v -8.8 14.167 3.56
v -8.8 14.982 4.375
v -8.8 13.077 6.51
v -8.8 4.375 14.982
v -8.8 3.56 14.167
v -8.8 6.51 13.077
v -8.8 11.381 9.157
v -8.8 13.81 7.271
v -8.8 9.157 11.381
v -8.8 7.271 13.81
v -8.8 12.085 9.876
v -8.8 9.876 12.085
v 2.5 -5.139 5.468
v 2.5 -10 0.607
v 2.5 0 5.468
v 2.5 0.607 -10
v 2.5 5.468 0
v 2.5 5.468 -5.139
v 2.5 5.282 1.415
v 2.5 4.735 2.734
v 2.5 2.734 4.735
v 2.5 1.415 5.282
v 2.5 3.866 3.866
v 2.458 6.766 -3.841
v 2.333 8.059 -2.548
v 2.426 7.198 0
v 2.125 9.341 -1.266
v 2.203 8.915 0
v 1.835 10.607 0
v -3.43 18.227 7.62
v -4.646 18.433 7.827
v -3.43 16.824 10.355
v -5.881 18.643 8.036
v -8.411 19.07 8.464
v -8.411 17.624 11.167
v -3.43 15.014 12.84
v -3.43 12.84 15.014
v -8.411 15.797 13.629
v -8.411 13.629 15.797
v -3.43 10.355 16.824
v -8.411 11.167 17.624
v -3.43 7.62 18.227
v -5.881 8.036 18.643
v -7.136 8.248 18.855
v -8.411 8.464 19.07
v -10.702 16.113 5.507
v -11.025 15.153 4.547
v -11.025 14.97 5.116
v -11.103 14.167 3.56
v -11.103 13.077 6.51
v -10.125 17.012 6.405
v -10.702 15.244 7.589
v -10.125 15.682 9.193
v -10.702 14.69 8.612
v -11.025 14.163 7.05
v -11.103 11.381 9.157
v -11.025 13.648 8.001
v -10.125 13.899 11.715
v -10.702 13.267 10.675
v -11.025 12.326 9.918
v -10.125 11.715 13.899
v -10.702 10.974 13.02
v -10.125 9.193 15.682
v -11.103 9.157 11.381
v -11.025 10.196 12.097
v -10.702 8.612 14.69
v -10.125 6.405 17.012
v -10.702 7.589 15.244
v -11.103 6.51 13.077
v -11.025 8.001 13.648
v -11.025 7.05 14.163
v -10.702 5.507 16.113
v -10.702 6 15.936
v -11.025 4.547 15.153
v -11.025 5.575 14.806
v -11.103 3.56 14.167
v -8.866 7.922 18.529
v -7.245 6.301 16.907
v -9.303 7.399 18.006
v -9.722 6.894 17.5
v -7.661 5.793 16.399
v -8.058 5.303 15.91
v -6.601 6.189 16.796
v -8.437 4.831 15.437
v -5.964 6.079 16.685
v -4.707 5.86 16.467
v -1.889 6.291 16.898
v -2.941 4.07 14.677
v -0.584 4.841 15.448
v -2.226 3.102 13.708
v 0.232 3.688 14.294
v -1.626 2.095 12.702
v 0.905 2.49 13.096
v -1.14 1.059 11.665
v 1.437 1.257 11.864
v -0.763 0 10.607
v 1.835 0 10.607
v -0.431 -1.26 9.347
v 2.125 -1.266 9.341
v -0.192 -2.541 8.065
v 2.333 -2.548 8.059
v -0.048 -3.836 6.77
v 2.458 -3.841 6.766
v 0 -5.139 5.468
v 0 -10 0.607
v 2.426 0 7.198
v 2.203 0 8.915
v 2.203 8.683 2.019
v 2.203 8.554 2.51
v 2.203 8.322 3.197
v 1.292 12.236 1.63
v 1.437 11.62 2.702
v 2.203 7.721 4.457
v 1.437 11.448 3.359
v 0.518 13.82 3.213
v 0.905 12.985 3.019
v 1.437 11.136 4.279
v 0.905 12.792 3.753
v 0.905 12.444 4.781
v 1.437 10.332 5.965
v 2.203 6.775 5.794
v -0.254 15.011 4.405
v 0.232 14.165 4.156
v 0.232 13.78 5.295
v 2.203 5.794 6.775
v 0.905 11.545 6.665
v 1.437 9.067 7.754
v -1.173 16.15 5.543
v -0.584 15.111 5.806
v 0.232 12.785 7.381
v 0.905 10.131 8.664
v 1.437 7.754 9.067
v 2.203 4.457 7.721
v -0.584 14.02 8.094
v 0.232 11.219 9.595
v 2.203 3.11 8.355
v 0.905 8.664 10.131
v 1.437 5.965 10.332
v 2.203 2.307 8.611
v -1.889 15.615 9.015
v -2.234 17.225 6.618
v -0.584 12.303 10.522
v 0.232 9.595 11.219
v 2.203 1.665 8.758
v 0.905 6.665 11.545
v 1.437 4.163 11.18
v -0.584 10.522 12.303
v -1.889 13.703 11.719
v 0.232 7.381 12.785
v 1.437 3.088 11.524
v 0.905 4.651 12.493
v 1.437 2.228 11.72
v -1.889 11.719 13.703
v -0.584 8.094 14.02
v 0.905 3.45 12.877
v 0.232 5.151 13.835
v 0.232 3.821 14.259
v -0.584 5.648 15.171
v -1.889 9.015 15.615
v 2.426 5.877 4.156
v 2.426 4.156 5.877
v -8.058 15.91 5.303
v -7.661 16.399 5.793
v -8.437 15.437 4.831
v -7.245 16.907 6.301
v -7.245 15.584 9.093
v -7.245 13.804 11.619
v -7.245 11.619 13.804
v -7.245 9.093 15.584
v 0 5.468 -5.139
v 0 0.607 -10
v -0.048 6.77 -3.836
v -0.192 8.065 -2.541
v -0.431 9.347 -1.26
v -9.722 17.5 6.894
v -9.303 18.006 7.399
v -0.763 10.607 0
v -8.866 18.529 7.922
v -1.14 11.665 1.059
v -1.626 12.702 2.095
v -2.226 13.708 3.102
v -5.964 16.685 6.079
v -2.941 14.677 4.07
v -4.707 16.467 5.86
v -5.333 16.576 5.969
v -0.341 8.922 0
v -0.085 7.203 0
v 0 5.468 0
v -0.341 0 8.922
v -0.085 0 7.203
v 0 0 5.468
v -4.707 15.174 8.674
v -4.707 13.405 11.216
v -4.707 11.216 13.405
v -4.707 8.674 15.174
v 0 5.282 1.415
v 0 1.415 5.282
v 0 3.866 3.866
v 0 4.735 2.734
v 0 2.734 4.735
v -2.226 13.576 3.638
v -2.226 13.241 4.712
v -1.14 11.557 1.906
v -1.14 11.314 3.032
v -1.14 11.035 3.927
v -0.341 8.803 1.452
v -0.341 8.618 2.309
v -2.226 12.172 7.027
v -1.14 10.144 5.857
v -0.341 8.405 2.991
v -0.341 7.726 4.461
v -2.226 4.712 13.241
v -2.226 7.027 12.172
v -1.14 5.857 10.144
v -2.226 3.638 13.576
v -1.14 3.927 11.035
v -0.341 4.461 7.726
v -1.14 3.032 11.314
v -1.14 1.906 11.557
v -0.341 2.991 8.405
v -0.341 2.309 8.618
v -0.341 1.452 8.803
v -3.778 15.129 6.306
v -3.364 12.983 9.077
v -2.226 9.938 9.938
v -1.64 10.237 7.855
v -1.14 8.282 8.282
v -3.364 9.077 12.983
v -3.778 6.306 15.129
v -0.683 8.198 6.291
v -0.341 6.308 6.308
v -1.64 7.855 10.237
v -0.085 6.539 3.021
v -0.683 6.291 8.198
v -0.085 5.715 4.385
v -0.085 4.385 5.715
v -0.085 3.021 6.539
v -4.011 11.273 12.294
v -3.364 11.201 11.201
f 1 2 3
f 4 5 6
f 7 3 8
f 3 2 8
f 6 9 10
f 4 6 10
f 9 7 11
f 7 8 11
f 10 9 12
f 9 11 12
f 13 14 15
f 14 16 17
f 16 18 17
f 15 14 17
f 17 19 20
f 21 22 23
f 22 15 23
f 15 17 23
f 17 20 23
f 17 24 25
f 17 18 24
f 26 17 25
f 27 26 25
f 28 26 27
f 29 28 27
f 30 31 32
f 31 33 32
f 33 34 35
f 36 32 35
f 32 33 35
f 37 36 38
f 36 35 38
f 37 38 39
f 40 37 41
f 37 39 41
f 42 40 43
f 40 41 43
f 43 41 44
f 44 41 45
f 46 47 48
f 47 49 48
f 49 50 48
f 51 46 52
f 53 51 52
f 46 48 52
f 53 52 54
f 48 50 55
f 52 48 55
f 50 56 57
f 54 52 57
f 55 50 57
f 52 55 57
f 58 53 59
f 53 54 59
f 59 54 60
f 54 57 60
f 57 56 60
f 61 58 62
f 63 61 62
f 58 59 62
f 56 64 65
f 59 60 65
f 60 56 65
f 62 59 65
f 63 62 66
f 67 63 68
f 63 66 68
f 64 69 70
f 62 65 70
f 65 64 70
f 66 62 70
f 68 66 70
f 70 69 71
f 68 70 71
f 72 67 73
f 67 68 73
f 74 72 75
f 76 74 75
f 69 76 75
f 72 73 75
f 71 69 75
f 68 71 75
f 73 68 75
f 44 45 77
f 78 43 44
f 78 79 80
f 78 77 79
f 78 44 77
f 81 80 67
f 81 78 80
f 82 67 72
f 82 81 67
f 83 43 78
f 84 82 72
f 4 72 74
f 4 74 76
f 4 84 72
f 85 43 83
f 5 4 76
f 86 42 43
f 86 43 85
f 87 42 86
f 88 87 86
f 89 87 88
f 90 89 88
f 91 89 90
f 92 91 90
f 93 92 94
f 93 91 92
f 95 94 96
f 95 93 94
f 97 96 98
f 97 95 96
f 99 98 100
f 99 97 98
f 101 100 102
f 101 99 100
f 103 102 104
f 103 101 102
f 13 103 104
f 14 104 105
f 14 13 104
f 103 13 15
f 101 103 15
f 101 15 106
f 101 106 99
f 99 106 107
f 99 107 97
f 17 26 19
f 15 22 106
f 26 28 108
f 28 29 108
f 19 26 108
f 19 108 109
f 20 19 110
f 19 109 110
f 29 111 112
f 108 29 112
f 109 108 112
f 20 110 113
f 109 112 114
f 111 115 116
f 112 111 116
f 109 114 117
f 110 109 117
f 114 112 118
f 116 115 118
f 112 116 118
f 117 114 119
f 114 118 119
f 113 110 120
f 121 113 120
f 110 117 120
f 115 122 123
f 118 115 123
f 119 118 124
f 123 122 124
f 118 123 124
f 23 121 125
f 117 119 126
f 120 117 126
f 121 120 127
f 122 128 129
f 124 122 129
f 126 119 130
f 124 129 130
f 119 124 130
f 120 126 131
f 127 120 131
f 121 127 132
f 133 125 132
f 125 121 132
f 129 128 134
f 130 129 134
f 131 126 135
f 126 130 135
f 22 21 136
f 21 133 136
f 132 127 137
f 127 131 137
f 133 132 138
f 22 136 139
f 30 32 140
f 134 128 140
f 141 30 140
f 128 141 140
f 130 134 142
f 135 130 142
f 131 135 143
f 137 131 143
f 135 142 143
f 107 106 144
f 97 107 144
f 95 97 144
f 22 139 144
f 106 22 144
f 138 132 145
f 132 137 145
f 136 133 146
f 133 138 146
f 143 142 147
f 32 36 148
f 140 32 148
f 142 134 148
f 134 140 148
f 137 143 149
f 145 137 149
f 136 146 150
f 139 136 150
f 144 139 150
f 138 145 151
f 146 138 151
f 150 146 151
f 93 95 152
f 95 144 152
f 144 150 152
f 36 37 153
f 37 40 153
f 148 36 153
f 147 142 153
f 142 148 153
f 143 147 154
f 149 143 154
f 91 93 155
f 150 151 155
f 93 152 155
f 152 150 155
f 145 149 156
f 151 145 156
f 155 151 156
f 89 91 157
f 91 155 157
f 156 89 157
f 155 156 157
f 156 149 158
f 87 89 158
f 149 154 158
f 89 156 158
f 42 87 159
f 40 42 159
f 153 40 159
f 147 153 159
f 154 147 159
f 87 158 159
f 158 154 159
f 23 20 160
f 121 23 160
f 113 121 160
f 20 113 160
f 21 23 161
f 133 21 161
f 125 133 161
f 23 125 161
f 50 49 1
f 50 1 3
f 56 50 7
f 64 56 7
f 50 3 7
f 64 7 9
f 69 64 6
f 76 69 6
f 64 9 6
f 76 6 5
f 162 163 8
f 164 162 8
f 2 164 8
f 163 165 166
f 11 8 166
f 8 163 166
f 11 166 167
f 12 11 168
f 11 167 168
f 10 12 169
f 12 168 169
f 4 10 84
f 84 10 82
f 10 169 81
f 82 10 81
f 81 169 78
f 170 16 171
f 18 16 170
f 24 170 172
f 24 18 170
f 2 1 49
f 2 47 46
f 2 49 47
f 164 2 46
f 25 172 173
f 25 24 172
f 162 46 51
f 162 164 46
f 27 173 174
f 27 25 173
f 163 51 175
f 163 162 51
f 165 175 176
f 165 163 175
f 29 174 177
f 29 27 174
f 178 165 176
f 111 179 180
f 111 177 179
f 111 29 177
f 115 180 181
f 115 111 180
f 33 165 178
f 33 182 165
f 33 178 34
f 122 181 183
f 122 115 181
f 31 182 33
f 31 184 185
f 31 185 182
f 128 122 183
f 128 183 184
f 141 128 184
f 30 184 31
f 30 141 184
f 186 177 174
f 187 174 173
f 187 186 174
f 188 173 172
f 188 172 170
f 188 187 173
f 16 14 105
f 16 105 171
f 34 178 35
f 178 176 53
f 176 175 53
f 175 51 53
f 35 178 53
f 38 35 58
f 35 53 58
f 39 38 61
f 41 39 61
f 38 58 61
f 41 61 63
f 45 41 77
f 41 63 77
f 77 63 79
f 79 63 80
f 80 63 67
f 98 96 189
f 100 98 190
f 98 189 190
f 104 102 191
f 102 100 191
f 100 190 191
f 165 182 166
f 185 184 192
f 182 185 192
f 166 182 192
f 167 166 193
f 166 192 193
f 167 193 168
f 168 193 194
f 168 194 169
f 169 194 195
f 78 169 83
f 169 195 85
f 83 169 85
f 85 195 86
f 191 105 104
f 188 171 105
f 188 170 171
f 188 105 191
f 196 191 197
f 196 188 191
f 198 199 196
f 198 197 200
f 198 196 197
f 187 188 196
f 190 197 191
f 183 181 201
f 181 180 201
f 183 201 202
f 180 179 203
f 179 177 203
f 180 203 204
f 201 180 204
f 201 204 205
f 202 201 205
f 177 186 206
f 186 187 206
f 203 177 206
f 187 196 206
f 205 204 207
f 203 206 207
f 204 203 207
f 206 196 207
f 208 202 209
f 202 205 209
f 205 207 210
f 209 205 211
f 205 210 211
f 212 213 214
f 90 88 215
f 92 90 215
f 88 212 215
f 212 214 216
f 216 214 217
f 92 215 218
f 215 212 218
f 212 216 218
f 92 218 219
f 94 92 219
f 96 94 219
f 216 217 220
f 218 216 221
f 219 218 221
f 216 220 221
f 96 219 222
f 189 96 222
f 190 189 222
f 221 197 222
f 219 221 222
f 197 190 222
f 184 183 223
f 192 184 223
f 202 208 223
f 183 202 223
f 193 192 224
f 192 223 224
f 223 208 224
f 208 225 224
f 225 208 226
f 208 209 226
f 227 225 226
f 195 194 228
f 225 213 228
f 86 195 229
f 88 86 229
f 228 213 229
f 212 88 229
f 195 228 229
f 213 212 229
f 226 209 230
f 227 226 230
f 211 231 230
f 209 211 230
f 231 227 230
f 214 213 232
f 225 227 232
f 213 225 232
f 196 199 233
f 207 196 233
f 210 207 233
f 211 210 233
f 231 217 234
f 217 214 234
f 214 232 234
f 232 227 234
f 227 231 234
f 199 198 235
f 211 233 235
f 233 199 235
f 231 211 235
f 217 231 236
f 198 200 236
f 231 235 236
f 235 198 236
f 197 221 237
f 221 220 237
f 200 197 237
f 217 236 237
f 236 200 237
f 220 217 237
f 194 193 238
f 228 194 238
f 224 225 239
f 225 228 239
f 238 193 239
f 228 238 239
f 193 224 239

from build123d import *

# Parameters (mm, degrees)
F1_ANGLE = 90
F3_DEPTH = 10
F4_DEPTH = 10
F6_DEPTH = 25


with BuildPart() as f1:
    # F0 (on Top) → F1 (revolve)
    with BuildSketch(Plane.XY):
        with BuildLine():
            Line((0, 5.4679050659), (0, 0))
            Line((0, 0), (2.5, 0))
            Line((2.5, 0), (2.5, 5.4679050659))
            ThreePointArc((2.5, 5.4679050659), (0.9585130135, 13.202552711), (-3.4303982666, 19.7552936717))
            Line((-3.4303982666, 19.7552936717), (-8.4106450471, 20.863986155))
            Line((-8.4106450471, 20.863986155), (-10.1253781611, 18.1776133961))
            ThreePointArc((-10.1253781611, 18.1776133961), (-10.8847896659, 16.4666549044), (-11.1032370478, 14.6075245875))
            Line((-11.1032370478, 14.6075245875), (-8.8, 14.6075245875))
            Line((-8.8, 14.6075245875), (-8.8, 15.6075245875))
            Line((-8.8, 15.6075245875), (-7.2452009387, 18.0433379567))
            Line((-7.2452009387, 18.0433379567), (-4.7073274561, 17.4783616859))
            ThreePointArc((-4.7073274561, 17.4783616859), (-1.2188561035, 11.9179050659), (0, 5.4679050659))
        make_face()
    revolve(axis=Axis((1.25, 0, 0), (1, 0, 0)), revolution_arc=F1_ANGLE)

    # F3 (add): a face of the model
    f3_faces = [f1.faces().sort_by_distance(p)[0] for p in [
        (-0.9869443197, 12.0087995874, 0),
    ]]
    extrude(f3_faces, amount=F3_DEPTH)

    # F4 (add): a face of the model
    f4_faces = [f1.faces().sort_by_distance(p)[0] for p in [
        (-0.9048130801, 0, 12.0409897573),
    ]]
    extrude(f4_faces, amount=F4_DEPTH)

    # F5 (on face) → F6 (intersect)
    with BuildSketch(Plane.YZ.offset(2.5)):
        Polygon((12.4376601817, 23.0442618995), (-10, 0.6066017178), (0.6066017178, -10), (23.0442618995, 12.4376601817), align=None)
    extrude(amount=-F6_DEPTH, mode=Mode.INTERSECT)


solid = f1.part
